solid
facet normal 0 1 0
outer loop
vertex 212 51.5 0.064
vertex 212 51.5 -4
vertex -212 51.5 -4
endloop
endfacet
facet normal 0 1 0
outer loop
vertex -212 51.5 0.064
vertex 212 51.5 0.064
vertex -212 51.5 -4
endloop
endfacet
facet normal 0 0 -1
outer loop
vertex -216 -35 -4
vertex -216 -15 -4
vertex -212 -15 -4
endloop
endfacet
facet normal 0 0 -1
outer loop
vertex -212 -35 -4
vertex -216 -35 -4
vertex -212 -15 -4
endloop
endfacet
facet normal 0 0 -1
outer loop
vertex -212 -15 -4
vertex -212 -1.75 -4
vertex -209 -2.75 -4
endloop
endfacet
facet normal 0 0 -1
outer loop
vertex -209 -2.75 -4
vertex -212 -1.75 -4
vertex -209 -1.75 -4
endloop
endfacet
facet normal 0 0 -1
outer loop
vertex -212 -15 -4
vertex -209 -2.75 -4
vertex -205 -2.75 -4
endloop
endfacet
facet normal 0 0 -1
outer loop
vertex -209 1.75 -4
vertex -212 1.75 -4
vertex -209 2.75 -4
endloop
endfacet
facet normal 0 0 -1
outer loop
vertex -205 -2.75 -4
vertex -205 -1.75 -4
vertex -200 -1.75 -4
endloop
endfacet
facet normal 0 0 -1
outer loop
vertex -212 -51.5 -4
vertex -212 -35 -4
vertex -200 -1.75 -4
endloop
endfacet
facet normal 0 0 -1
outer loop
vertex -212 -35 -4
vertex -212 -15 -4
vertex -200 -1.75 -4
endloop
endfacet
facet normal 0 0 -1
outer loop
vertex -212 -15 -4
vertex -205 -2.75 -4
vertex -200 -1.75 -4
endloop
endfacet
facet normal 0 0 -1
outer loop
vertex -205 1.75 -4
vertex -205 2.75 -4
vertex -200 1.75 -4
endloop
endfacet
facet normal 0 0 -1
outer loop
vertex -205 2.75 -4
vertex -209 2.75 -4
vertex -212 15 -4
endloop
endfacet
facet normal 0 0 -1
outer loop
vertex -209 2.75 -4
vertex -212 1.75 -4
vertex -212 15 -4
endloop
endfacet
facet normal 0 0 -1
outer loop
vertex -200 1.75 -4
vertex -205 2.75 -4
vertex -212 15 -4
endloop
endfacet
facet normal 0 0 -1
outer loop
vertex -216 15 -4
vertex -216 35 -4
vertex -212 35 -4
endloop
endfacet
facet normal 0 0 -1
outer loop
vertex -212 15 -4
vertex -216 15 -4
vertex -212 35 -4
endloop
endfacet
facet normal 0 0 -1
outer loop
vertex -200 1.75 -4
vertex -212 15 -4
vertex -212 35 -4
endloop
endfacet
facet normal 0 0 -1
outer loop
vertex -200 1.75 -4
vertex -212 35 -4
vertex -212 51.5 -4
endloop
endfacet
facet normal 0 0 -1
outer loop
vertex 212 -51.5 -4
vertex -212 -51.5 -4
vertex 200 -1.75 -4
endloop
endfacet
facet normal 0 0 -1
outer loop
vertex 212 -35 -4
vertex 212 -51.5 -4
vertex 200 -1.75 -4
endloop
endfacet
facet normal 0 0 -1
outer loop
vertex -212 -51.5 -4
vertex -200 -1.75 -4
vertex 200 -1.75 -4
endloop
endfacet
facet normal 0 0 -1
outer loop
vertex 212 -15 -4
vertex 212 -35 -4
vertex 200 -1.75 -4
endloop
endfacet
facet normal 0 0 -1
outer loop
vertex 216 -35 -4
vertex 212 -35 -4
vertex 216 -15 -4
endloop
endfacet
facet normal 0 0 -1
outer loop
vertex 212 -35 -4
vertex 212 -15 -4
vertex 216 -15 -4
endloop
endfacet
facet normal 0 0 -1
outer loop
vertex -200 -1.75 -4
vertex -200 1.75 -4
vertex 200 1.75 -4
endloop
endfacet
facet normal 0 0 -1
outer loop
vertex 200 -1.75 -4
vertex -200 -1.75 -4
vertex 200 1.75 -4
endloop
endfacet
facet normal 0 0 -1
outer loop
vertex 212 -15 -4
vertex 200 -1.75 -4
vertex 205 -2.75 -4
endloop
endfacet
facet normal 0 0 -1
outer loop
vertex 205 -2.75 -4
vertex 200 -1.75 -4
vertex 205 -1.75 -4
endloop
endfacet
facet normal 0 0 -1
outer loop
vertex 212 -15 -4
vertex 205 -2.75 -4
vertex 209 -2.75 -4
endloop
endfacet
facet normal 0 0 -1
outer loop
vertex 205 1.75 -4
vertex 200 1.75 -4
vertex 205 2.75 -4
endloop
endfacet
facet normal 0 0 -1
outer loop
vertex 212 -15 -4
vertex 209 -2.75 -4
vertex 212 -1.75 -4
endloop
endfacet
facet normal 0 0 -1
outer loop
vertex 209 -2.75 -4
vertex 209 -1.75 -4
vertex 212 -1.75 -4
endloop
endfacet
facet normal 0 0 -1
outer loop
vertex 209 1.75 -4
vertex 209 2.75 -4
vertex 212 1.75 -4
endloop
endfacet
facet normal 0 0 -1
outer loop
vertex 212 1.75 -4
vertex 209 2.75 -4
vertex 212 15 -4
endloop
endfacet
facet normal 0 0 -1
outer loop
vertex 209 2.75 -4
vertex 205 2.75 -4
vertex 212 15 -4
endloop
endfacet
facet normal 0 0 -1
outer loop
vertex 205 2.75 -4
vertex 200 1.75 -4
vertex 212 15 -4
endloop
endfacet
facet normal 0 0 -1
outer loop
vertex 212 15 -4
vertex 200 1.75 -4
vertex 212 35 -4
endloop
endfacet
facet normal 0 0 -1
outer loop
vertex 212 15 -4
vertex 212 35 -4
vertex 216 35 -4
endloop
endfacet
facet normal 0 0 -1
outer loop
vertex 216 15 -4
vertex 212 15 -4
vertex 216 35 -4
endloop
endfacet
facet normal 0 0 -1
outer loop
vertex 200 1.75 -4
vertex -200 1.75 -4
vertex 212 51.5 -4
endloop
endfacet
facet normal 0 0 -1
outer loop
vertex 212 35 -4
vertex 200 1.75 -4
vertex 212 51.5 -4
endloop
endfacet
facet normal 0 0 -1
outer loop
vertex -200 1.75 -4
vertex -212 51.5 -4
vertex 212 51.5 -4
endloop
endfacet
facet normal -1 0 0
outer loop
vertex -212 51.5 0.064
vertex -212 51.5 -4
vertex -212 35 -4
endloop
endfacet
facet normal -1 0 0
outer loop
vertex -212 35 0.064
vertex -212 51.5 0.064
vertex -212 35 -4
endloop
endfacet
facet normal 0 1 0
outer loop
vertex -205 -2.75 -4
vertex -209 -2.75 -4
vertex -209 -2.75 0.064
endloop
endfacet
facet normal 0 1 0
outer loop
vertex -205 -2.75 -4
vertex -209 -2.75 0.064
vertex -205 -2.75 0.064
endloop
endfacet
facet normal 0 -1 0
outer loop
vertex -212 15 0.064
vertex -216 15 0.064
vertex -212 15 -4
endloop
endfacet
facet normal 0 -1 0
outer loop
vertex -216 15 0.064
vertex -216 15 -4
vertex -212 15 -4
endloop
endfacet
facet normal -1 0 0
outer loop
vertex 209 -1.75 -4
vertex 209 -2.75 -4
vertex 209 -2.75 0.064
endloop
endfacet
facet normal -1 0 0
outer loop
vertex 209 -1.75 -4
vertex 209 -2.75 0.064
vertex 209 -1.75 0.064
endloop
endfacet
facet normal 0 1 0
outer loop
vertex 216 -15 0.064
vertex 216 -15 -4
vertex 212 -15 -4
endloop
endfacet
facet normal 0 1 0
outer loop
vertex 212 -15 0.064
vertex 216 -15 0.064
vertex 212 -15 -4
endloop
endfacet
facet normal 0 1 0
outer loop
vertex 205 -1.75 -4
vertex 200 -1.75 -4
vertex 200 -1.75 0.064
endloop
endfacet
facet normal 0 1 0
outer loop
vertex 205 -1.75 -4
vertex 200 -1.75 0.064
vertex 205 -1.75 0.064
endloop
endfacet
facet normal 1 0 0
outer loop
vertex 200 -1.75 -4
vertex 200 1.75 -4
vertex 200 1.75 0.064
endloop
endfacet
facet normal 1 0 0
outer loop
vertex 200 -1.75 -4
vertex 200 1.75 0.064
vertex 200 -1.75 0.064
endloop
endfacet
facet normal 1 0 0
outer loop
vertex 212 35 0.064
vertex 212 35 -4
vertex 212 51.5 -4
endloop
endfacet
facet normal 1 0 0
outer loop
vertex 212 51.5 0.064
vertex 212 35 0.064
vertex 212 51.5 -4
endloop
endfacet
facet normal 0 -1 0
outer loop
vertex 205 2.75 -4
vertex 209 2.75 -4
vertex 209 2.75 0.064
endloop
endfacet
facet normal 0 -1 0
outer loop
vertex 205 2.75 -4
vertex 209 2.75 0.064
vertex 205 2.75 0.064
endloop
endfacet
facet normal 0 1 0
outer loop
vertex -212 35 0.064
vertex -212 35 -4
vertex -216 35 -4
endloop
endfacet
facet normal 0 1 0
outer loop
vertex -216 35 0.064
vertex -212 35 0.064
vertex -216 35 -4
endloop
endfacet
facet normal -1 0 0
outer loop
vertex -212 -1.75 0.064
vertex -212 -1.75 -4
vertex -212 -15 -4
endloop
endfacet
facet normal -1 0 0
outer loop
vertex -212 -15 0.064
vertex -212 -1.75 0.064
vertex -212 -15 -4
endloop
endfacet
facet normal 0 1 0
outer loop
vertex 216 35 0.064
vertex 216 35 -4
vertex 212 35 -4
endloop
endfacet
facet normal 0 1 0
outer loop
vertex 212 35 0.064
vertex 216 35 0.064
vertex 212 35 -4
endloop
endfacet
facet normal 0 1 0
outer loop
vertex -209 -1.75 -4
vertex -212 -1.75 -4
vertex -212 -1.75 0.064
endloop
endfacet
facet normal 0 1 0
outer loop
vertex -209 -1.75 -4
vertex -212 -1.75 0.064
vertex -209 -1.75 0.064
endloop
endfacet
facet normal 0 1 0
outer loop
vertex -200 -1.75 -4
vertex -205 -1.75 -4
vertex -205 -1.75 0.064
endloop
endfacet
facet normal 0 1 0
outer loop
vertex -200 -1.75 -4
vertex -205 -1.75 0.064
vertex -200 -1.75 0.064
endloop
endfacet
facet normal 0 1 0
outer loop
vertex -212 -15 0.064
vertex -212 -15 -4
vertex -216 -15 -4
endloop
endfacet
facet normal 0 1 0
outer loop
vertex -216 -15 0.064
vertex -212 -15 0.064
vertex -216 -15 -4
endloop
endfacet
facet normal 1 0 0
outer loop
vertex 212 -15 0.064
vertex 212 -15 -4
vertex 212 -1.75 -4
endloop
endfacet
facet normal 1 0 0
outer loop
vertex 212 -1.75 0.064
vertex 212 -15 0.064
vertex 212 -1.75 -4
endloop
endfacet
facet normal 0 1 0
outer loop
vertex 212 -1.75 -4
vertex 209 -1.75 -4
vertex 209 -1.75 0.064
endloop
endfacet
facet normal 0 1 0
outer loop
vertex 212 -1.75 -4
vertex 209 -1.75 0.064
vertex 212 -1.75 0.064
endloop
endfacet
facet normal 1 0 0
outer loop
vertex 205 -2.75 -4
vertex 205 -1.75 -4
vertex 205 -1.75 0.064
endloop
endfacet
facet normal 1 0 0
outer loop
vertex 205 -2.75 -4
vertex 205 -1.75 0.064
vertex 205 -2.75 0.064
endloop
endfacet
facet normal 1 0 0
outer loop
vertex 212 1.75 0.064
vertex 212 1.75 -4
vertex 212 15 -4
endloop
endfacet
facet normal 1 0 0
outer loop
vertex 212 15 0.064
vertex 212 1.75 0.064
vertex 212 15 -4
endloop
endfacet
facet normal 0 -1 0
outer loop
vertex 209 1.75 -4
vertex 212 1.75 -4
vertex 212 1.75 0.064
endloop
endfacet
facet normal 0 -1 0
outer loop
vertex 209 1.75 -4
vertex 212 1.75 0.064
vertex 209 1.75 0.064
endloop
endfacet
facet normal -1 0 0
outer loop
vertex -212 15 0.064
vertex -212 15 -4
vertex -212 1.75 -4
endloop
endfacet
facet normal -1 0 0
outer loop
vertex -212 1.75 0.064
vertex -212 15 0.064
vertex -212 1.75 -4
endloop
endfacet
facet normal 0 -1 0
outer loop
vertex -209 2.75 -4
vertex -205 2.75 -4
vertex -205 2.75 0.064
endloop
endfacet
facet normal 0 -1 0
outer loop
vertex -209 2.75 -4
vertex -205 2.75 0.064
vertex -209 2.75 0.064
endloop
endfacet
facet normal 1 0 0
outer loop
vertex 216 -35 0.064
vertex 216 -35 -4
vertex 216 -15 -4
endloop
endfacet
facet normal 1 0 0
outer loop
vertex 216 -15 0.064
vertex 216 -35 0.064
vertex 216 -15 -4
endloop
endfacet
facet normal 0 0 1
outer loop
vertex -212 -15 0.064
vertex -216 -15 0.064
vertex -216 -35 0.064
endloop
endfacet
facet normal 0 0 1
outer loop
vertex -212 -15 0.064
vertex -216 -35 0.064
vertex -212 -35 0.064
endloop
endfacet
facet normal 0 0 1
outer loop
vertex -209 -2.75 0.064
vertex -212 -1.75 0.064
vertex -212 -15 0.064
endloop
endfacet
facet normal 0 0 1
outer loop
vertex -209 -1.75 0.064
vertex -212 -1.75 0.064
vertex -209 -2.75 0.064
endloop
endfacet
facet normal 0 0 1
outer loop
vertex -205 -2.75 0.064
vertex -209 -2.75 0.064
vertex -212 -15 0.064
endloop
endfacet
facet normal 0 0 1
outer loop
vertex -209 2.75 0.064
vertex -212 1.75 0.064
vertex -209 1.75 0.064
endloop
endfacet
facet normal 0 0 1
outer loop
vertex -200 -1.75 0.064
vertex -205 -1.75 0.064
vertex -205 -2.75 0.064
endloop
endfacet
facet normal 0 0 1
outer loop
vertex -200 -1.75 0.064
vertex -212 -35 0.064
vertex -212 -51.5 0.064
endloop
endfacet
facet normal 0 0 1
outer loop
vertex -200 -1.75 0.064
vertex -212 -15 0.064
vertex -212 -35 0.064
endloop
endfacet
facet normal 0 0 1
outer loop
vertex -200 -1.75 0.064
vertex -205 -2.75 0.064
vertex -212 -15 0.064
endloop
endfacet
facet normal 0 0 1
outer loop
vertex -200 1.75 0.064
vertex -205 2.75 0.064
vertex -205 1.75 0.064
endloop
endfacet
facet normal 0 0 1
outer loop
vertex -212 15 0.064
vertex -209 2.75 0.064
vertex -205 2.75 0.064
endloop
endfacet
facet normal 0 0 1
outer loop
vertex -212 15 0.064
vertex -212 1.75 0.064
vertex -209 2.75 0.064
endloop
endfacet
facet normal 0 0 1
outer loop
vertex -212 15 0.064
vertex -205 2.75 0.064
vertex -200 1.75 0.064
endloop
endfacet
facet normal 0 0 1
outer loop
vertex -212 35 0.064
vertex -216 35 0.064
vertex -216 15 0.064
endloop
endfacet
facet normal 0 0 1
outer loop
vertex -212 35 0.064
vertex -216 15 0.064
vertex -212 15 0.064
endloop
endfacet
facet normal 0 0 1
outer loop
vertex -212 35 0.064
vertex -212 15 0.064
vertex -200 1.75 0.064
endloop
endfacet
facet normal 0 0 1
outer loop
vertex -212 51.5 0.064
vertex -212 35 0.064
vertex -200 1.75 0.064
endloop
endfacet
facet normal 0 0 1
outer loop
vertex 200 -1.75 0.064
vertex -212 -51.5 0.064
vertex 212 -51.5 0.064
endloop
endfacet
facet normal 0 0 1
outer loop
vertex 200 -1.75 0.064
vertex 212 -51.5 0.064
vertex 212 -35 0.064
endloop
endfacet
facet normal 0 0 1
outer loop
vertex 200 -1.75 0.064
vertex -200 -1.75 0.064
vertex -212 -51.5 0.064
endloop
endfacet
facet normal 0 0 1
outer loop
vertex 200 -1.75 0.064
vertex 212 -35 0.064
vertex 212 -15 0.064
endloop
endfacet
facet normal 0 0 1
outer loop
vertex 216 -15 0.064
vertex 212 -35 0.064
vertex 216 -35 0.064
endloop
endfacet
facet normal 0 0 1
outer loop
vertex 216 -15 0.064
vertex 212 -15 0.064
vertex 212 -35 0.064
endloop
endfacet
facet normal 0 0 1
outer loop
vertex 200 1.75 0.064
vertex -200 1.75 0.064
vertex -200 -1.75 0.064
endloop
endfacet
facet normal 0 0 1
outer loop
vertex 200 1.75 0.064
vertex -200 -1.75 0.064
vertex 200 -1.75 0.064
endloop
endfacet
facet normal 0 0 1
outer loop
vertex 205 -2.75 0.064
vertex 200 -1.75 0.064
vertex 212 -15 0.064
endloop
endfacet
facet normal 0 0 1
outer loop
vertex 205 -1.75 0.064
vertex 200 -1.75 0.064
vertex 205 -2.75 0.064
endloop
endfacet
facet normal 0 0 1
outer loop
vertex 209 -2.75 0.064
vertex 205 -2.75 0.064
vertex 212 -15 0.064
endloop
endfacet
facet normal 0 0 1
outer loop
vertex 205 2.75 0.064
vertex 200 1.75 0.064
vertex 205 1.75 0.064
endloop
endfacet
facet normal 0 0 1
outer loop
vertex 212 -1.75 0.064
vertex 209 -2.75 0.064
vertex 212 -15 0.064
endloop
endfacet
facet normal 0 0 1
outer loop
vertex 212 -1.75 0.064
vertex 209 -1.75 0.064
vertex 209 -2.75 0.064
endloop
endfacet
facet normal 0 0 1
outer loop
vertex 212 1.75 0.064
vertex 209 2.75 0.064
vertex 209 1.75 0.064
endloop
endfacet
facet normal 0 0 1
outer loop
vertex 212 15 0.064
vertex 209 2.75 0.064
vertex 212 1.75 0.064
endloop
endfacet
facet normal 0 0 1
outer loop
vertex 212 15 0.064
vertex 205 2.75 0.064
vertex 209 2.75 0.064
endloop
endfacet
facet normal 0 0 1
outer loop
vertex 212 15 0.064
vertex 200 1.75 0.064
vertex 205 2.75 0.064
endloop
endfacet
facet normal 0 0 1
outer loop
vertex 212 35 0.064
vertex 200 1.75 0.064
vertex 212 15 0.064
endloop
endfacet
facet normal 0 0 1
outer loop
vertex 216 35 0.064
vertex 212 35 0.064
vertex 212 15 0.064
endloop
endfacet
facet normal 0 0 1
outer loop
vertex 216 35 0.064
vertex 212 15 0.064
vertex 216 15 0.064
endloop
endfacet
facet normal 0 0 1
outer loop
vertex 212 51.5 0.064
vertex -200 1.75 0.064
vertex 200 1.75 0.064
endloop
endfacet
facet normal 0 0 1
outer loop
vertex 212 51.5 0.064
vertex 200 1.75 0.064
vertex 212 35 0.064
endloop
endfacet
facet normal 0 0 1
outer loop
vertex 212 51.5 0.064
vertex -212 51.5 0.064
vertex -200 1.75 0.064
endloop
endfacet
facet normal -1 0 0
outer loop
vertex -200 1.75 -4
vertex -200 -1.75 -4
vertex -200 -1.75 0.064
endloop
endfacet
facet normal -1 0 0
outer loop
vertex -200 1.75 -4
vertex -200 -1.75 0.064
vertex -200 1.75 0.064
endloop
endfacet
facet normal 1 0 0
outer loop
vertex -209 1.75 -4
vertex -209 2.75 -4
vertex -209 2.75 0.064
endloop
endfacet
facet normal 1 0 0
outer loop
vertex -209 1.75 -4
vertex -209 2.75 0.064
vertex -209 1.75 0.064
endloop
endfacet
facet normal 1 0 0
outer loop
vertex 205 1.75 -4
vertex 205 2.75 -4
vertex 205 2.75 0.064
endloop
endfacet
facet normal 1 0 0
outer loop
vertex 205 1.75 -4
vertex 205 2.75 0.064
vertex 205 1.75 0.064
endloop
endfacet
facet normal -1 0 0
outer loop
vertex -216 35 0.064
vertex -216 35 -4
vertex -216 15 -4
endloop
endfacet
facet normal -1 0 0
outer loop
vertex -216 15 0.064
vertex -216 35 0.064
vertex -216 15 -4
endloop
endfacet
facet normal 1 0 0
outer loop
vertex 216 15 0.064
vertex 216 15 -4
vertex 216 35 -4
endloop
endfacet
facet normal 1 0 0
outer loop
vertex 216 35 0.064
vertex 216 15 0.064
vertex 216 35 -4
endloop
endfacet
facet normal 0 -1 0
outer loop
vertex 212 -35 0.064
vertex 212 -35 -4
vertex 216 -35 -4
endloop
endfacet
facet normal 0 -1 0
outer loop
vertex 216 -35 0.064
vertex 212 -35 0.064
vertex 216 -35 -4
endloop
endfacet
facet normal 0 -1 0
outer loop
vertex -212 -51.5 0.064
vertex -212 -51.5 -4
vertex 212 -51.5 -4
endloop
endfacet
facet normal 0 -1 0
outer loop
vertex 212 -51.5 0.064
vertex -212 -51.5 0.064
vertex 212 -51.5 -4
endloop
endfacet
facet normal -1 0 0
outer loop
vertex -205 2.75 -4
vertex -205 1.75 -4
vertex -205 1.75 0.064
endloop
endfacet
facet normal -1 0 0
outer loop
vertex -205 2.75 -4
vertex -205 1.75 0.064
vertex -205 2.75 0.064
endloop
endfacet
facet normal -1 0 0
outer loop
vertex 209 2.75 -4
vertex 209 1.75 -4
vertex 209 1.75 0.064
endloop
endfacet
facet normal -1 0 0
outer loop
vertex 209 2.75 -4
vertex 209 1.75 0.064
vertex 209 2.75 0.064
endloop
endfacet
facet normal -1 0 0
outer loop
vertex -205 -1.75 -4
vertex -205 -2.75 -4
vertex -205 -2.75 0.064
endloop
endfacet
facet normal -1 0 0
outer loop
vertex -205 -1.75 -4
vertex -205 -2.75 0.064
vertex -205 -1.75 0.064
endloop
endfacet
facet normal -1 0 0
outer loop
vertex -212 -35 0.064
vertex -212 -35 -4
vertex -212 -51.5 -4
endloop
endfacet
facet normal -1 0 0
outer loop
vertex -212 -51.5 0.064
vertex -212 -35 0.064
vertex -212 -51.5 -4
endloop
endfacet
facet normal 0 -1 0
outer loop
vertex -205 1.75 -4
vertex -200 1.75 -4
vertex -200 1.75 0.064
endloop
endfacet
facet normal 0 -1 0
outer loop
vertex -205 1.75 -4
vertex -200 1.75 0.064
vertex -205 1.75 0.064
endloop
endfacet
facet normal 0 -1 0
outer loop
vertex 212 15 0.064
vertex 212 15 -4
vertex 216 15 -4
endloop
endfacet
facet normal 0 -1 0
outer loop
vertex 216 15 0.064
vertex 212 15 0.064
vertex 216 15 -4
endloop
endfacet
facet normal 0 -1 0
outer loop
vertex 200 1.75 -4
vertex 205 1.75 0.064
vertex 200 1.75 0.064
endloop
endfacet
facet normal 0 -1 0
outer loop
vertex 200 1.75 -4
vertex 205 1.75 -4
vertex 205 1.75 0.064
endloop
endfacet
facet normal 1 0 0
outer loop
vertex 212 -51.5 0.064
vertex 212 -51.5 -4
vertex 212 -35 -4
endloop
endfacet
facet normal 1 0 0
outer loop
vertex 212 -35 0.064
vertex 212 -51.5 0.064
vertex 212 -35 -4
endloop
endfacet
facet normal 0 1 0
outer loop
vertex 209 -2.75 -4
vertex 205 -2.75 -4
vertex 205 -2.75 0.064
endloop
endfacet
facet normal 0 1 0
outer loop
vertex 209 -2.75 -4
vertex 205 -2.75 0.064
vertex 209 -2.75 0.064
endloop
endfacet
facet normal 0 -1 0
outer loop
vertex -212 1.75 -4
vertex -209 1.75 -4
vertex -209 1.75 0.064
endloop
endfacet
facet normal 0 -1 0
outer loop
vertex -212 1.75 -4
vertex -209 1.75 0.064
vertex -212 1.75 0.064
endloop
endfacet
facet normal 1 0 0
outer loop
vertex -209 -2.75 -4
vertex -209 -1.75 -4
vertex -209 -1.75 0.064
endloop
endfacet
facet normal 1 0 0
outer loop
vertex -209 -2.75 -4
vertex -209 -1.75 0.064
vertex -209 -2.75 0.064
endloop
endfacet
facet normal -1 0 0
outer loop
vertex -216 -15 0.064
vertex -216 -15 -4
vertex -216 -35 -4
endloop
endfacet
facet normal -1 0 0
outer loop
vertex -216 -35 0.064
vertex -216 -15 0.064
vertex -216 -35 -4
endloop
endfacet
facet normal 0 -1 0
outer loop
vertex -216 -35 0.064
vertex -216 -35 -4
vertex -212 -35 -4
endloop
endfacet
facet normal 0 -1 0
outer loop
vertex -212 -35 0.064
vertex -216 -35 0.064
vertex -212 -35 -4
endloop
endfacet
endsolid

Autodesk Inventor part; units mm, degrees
ref_plane "YZ Plane" through (0, 0, 0) normal (1, 0, 0) x (0, 1, 0)
ref_plane "XZ Plane" through (0, 0, 0) normal (0, 1, 0) x (-1, 0, 0)
ref_plane "Work Plane1" through (0, 0, -4) normal (0, 0, 1) x (1, 0, 0)
sketch "Sketch1" plane through (0, 0, -4) normal (0, 0, 1) x (1, 0, 0)
  line L0 (209, -2.75) -> (209, -1.75)
  line L1 (216, -35) -> (216, -15)
  line L2 (212, -35) -> (216, -35)
  line L3 (209, -1.75) -> (212, -1.75)
  line L4 (-212, -1.75) -> (-209, -1.75)
  line L5 (-212, -51.5) -> (212, -51.5)
  line L6 (-209, -1.75) -> (-209, -2.75)
  line L7 (-212, -35) -> (-212, -51.5)
  line L8 (-216, 15) -> (-212, 15)
  line L9 (-216, -35) -> (-212, -35)
  line L10 (-216, 35) -> (-216, 15)
  line L11 (-209, -2.75) -> (-205, -2.75)
  line L12 (-216, -15) -> (-216, -35)
  line L13 (-212, 35) -> (-216, 35)
  line L14 (-205, -2.75) -> (-205, -1.75)
  line L15 (-212, -15) -> (-216, -15)
  line L16 (-212, 51.5) -> (-212, 35)
  line L17 (-205, -1.75) -> (-200, -1.75)
  line L18 (-212, -1.75) -> (-212, -15)
  line L19 (212, 51.5) -> (-212, 51.5)
  line L20 (-200, -1.75) -> (-200, 1.75)
  line L21 (212, 1.75) -> (209, 1.75)
  line L22 (212, 35) -> (212, 51.5)
  line L23 (-200, 1.75) -> (-205, 1.75)
  line L24 (209, 1.75) -> (209, 2.75)
  line L25 (216, 35) -> (212, 35)
  line L26 (-205, 1.75) -> (-205, 2.75)
  line L27 (209, 2.75) -> (205, 2.75)
  line L28 (-205, 2.75) -> (-209, 2.75)
  line L29 (205, 2.75) -> (205, 1.75)
  line L30 (216, 15) -> (216, 35)
  line L31 (-209, 2.75) -> (-209, 1.75)
  line L32 (205, 1.75) -> (200, 1.75)
  line L33 (212, 15) -> (216, 15)
  line L34 (212, -51.5) -> (212, -35)
  line L35 (-209, 1.75) -> (-212, 1.75)
  line L36 (200, 1.75) -> (200, -1.75)
  line L37 (212, 1.75) -> (212, 15)
  line L38 (-212, 15) -> (-212, 1.75)
  line L39 (200, -1.75) -> (205, -1.75)
  line L40 (205, -1.75) -> (205, -2.75)
  line L41 (212, -15) -> (212, -1.75)
  line L42 (205, -2.75) -> (209, -2.75)
  line L43 (216, -15) -> (212, -15)
extrude "Extrusion1" add sketch "Sketch1" along normal blind 4.064
properties part number "Hopper Leg Brace" material "Aluminum 6061"
